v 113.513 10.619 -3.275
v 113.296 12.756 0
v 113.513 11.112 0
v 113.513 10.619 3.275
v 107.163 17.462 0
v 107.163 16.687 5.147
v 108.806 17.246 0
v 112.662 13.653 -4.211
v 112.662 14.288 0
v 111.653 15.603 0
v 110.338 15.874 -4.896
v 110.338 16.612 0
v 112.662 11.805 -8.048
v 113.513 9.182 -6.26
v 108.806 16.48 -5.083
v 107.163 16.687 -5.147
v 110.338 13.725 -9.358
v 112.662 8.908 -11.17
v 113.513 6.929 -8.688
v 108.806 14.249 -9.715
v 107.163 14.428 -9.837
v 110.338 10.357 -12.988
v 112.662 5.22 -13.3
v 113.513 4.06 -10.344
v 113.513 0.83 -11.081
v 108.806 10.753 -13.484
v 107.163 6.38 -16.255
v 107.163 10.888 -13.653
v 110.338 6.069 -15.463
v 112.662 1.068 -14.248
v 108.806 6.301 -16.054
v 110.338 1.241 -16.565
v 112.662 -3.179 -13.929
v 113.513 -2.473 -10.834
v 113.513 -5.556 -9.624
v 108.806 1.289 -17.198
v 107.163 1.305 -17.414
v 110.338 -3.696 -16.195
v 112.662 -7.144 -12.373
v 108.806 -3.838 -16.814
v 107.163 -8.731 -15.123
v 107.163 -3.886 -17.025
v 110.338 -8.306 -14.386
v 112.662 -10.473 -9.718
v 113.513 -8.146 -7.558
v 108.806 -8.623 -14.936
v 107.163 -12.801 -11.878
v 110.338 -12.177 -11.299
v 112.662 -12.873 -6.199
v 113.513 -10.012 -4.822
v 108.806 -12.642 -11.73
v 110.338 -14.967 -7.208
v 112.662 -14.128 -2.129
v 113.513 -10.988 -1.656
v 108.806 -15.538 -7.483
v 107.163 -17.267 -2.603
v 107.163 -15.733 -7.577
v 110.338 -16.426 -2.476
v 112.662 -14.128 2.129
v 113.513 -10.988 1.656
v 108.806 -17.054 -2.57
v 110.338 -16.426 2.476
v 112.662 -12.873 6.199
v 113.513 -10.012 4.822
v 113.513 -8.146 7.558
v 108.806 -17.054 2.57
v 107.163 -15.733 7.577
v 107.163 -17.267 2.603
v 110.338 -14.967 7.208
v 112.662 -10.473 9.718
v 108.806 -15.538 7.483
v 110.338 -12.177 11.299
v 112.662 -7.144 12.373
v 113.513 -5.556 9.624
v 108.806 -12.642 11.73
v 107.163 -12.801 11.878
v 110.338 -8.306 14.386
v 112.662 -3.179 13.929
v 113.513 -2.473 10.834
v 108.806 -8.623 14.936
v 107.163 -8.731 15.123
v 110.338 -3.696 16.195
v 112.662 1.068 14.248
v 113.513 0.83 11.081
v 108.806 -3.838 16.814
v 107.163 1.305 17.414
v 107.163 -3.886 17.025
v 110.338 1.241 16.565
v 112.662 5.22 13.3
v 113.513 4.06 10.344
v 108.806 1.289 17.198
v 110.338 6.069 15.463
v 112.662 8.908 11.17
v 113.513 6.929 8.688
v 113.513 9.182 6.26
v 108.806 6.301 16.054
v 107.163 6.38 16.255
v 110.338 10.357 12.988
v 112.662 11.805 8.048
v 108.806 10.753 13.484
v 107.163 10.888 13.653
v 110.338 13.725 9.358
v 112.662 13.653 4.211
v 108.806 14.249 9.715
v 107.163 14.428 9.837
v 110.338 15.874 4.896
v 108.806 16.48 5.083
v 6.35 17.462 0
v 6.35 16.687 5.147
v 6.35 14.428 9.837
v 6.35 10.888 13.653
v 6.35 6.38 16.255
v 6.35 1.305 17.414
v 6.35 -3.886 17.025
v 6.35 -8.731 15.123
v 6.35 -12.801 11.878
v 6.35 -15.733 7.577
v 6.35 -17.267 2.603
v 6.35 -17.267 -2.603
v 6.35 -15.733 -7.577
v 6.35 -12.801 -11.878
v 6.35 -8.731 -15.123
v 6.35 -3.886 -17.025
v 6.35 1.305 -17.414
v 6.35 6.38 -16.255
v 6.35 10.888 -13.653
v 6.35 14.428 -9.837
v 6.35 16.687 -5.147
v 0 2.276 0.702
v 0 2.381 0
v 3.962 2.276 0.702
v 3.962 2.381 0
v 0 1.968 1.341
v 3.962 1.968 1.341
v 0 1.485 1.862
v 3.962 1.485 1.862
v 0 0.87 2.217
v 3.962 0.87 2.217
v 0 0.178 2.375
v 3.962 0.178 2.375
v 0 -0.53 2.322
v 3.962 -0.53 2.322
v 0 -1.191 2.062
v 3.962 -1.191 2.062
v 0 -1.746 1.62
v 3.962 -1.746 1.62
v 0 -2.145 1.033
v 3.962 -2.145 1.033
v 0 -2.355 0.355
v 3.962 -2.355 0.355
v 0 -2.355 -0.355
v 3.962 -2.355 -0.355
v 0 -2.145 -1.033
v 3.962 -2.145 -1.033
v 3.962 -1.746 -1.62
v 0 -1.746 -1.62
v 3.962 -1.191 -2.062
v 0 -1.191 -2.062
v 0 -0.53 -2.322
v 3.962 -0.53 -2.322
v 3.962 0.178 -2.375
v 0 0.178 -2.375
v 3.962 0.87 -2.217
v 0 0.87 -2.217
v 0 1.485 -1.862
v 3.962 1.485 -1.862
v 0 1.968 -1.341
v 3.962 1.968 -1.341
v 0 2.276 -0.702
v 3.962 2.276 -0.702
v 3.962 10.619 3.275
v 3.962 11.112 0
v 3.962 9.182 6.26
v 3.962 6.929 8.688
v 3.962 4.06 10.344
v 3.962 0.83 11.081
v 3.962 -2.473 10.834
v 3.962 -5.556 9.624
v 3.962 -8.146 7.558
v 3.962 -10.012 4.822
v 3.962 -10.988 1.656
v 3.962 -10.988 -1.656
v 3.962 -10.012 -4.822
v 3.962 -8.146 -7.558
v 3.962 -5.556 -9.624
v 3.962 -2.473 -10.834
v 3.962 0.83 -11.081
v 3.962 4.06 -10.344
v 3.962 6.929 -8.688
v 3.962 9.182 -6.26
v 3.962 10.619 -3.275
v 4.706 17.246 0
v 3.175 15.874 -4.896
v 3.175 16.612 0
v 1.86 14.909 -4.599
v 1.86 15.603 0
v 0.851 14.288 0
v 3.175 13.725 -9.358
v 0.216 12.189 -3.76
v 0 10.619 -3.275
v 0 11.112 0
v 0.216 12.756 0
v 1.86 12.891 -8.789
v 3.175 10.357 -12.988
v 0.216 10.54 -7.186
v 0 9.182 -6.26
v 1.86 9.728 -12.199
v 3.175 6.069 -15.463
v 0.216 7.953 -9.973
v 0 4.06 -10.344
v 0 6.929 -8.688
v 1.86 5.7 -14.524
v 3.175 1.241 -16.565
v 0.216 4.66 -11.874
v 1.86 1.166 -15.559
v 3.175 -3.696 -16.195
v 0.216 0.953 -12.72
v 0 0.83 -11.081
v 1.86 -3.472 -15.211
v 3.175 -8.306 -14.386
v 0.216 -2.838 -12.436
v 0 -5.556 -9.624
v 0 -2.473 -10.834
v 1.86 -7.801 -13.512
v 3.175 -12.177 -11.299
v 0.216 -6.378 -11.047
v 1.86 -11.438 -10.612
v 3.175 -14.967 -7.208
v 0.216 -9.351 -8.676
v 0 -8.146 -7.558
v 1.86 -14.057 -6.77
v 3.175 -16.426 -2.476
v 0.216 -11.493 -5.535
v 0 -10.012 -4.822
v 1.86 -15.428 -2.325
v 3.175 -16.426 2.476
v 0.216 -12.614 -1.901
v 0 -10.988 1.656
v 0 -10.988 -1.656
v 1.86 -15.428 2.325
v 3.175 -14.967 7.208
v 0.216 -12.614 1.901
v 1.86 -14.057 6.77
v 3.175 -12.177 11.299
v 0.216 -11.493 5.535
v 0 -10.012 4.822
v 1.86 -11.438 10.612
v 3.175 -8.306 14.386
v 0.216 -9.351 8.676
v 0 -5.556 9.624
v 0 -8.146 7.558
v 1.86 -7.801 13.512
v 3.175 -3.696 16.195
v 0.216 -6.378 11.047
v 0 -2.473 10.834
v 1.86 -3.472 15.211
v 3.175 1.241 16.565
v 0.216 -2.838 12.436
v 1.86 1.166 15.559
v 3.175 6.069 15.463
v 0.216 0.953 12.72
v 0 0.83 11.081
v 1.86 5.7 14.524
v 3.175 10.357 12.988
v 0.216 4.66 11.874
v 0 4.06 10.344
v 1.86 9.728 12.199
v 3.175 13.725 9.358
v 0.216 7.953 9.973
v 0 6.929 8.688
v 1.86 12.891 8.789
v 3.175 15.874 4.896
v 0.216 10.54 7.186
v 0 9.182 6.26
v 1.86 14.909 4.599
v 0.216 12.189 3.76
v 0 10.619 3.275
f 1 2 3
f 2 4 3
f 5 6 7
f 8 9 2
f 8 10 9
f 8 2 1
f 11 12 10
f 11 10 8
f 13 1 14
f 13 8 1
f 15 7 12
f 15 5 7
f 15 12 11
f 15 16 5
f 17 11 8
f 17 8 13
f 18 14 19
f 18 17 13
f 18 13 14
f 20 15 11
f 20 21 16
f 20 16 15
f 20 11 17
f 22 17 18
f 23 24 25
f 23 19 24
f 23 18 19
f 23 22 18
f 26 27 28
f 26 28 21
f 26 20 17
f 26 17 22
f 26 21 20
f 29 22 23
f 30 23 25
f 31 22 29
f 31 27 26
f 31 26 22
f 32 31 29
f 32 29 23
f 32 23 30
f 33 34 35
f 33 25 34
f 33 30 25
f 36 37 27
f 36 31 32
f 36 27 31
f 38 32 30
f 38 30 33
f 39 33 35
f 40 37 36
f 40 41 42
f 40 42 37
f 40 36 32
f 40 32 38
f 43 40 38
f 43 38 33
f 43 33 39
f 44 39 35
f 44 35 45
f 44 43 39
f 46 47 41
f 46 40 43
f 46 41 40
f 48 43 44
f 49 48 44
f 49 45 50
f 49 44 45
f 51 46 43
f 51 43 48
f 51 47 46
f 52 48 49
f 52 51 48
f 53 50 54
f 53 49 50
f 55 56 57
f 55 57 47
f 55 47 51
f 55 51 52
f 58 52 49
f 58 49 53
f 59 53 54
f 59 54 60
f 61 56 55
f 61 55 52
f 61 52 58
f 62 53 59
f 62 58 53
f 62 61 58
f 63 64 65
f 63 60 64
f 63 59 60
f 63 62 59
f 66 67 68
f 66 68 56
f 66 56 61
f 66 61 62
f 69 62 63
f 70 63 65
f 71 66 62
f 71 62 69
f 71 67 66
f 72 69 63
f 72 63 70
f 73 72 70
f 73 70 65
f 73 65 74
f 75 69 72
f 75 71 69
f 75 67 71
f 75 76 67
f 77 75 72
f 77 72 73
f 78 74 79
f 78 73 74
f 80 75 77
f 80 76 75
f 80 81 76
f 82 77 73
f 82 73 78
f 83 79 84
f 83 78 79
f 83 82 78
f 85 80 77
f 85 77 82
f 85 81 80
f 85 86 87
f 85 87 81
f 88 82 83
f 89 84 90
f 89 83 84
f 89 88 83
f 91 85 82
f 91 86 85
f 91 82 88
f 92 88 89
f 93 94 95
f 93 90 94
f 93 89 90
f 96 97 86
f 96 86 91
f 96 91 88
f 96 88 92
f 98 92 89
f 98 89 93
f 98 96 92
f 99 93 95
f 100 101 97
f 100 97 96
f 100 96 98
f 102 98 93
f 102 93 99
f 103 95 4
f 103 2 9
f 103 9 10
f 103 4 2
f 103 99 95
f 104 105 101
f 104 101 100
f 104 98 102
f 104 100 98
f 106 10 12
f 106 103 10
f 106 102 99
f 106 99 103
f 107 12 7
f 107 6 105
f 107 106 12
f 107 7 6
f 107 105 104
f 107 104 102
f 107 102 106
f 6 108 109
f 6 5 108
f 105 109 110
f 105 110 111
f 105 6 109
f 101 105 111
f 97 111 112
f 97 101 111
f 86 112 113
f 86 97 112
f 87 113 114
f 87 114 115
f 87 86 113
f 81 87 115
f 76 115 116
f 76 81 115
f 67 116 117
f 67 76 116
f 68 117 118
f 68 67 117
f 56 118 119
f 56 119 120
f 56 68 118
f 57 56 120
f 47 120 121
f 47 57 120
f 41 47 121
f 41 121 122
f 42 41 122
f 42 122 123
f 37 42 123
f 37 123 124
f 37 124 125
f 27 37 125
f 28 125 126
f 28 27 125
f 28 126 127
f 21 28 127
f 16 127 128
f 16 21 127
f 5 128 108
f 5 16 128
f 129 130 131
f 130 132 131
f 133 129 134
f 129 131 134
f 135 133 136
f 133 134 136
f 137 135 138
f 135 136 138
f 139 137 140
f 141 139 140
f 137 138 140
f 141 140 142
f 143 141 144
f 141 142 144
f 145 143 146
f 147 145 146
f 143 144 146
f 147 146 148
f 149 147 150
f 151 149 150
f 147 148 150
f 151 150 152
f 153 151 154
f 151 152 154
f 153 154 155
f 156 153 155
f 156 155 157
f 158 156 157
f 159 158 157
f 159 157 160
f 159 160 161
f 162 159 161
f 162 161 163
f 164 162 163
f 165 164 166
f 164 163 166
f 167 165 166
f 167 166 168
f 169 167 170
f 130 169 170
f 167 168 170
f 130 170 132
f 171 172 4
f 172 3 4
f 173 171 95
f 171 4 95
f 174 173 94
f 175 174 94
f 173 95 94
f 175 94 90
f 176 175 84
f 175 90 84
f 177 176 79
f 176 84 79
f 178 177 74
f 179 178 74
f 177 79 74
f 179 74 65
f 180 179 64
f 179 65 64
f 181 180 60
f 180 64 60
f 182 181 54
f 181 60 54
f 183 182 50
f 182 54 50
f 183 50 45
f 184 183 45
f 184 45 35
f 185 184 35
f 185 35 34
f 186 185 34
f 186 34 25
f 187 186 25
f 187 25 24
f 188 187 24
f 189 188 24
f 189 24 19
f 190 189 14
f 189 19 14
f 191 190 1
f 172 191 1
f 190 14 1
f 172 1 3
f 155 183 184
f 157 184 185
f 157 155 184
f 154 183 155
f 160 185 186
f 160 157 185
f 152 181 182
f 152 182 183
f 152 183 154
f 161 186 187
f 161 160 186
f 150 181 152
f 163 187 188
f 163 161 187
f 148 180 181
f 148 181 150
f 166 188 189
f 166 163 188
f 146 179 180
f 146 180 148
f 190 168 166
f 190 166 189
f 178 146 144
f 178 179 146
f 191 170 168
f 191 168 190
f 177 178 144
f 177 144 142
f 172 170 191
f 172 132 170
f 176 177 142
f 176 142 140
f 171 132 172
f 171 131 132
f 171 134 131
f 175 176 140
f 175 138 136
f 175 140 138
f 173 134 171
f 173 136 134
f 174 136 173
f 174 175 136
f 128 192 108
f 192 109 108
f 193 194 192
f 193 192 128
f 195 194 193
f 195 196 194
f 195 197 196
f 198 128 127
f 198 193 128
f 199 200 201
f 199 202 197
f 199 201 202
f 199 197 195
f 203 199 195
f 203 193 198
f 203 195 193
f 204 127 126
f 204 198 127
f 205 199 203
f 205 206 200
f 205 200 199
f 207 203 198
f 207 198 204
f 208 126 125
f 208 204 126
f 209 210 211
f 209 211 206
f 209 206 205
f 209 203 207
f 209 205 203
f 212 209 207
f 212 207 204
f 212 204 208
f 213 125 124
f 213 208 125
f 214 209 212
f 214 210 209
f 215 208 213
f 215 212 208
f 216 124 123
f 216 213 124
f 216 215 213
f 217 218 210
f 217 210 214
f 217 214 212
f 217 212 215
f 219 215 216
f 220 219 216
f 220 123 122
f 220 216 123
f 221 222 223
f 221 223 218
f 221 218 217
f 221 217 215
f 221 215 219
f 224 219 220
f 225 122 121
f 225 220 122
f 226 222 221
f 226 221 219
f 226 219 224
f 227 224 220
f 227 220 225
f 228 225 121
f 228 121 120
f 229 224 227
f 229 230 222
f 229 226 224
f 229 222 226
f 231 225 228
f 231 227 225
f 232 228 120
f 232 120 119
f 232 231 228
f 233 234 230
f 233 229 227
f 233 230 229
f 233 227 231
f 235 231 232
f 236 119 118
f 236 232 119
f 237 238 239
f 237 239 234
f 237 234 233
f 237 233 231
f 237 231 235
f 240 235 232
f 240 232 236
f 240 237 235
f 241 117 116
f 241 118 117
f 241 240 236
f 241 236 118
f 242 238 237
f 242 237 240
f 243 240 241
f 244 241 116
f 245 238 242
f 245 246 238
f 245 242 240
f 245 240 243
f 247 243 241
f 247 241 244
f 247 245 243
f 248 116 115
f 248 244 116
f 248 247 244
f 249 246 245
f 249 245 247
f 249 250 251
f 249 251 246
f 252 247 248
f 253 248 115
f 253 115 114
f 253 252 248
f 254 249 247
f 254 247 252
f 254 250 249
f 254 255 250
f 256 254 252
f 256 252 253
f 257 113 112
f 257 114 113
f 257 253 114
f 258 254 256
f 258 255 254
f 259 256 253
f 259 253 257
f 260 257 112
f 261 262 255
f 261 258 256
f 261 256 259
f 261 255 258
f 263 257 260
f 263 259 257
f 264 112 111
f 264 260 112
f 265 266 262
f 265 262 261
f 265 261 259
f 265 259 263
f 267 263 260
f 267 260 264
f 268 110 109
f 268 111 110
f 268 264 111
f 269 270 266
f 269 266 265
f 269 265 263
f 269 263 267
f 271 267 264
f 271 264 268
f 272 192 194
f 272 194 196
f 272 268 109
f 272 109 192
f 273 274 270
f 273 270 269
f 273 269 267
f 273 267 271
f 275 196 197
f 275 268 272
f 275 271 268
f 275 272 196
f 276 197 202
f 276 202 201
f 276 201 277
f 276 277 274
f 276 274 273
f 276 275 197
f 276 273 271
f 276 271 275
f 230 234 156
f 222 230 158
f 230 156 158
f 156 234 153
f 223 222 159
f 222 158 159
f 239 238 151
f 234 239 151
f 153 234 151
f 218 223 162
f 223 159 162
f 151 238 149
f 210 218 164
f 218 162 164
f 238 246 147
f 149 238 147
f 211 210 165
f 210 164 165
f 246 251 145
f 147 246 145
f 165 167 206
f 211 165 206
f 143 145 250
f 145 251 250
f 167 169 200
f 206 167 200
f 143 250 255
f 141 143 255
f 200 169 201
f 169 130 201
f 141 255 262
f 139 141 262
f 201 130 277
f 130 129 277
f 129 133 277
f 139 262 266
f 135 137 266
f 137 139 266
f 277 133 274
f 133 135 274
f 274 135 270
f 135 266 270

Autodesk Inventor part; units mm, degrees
ref_plane "YZ Plane" through (0, 0, 0) normal (1, 0, 0) x (0, 1, 0)
ref_plane "XZ Plane" through (0, 0, 0) normal (0, 1, 0) x (-1, 0, 0)
ref_plane "XY Plane" through (0, 0, 0) normal (0, 0, 1) x (1, 0, 0)
sketch "Sketch1" plane through (0, 0, 0) normal (0, 0, 1) x (1, 0, 0)
  line L0 (0, 0) -> (113.5126, 0)
  line L1 (0, 2.3813) -> (3.9624, 2.3813)
  line L2 (3.9624, 2.3813) -> (3.9624, 0)
  line L3 (0, 0) -> (0, 2.3813)
  line L4 (0, 0) -> (0, 11.1125)
  line L5 (6.35, 17.4625) -> (107.1626, 17.4625)
  line L6 (0, 17.4625) -> (0, 11.1125)
  line L7 (3.9624, 11.1125) -> (113.5126, 11.1125)
  line L8 (0, 17.4625) -> (3.9624, 17.4625)
  line L9 (3.9624, 11.1125) -> (3.9624, 2.3813)
  arc A0 (6.35, 17.4625) -> (0, 11.1125) centre (6.35, 11.1125) ccw
  line L10 (113.5126, 11.1125) -> (113.5126, 11.1125)
  arc A1 (113.5126, 11.1125) -> (107.1626, 17.4625) centre (107.1626, 11.1125) ccw
  point P0 (113.5126, 17.4625)
  dimension "d0" = 113.5126
  dimension "d1" = 2.3813
  dimension "d2" = 3.9624
  dimension "d3" = 17.4625
  dimension "d4" = 113.5126
  dimension "d5" = 6.35
  dimension "d6" = 113.5126
  dimension "d7" = 3.9624
  dimension "d8" = 6.35
  dimension "d9" = 6.35
revolve "Revolution1" add sketch "Sketch1" angle 360 about axis through (0, 0, 0) along (1, 0, 0) contours L4 A0 L5 A1 L7 L9 L1
properties part number "Rubber Sleeve"
